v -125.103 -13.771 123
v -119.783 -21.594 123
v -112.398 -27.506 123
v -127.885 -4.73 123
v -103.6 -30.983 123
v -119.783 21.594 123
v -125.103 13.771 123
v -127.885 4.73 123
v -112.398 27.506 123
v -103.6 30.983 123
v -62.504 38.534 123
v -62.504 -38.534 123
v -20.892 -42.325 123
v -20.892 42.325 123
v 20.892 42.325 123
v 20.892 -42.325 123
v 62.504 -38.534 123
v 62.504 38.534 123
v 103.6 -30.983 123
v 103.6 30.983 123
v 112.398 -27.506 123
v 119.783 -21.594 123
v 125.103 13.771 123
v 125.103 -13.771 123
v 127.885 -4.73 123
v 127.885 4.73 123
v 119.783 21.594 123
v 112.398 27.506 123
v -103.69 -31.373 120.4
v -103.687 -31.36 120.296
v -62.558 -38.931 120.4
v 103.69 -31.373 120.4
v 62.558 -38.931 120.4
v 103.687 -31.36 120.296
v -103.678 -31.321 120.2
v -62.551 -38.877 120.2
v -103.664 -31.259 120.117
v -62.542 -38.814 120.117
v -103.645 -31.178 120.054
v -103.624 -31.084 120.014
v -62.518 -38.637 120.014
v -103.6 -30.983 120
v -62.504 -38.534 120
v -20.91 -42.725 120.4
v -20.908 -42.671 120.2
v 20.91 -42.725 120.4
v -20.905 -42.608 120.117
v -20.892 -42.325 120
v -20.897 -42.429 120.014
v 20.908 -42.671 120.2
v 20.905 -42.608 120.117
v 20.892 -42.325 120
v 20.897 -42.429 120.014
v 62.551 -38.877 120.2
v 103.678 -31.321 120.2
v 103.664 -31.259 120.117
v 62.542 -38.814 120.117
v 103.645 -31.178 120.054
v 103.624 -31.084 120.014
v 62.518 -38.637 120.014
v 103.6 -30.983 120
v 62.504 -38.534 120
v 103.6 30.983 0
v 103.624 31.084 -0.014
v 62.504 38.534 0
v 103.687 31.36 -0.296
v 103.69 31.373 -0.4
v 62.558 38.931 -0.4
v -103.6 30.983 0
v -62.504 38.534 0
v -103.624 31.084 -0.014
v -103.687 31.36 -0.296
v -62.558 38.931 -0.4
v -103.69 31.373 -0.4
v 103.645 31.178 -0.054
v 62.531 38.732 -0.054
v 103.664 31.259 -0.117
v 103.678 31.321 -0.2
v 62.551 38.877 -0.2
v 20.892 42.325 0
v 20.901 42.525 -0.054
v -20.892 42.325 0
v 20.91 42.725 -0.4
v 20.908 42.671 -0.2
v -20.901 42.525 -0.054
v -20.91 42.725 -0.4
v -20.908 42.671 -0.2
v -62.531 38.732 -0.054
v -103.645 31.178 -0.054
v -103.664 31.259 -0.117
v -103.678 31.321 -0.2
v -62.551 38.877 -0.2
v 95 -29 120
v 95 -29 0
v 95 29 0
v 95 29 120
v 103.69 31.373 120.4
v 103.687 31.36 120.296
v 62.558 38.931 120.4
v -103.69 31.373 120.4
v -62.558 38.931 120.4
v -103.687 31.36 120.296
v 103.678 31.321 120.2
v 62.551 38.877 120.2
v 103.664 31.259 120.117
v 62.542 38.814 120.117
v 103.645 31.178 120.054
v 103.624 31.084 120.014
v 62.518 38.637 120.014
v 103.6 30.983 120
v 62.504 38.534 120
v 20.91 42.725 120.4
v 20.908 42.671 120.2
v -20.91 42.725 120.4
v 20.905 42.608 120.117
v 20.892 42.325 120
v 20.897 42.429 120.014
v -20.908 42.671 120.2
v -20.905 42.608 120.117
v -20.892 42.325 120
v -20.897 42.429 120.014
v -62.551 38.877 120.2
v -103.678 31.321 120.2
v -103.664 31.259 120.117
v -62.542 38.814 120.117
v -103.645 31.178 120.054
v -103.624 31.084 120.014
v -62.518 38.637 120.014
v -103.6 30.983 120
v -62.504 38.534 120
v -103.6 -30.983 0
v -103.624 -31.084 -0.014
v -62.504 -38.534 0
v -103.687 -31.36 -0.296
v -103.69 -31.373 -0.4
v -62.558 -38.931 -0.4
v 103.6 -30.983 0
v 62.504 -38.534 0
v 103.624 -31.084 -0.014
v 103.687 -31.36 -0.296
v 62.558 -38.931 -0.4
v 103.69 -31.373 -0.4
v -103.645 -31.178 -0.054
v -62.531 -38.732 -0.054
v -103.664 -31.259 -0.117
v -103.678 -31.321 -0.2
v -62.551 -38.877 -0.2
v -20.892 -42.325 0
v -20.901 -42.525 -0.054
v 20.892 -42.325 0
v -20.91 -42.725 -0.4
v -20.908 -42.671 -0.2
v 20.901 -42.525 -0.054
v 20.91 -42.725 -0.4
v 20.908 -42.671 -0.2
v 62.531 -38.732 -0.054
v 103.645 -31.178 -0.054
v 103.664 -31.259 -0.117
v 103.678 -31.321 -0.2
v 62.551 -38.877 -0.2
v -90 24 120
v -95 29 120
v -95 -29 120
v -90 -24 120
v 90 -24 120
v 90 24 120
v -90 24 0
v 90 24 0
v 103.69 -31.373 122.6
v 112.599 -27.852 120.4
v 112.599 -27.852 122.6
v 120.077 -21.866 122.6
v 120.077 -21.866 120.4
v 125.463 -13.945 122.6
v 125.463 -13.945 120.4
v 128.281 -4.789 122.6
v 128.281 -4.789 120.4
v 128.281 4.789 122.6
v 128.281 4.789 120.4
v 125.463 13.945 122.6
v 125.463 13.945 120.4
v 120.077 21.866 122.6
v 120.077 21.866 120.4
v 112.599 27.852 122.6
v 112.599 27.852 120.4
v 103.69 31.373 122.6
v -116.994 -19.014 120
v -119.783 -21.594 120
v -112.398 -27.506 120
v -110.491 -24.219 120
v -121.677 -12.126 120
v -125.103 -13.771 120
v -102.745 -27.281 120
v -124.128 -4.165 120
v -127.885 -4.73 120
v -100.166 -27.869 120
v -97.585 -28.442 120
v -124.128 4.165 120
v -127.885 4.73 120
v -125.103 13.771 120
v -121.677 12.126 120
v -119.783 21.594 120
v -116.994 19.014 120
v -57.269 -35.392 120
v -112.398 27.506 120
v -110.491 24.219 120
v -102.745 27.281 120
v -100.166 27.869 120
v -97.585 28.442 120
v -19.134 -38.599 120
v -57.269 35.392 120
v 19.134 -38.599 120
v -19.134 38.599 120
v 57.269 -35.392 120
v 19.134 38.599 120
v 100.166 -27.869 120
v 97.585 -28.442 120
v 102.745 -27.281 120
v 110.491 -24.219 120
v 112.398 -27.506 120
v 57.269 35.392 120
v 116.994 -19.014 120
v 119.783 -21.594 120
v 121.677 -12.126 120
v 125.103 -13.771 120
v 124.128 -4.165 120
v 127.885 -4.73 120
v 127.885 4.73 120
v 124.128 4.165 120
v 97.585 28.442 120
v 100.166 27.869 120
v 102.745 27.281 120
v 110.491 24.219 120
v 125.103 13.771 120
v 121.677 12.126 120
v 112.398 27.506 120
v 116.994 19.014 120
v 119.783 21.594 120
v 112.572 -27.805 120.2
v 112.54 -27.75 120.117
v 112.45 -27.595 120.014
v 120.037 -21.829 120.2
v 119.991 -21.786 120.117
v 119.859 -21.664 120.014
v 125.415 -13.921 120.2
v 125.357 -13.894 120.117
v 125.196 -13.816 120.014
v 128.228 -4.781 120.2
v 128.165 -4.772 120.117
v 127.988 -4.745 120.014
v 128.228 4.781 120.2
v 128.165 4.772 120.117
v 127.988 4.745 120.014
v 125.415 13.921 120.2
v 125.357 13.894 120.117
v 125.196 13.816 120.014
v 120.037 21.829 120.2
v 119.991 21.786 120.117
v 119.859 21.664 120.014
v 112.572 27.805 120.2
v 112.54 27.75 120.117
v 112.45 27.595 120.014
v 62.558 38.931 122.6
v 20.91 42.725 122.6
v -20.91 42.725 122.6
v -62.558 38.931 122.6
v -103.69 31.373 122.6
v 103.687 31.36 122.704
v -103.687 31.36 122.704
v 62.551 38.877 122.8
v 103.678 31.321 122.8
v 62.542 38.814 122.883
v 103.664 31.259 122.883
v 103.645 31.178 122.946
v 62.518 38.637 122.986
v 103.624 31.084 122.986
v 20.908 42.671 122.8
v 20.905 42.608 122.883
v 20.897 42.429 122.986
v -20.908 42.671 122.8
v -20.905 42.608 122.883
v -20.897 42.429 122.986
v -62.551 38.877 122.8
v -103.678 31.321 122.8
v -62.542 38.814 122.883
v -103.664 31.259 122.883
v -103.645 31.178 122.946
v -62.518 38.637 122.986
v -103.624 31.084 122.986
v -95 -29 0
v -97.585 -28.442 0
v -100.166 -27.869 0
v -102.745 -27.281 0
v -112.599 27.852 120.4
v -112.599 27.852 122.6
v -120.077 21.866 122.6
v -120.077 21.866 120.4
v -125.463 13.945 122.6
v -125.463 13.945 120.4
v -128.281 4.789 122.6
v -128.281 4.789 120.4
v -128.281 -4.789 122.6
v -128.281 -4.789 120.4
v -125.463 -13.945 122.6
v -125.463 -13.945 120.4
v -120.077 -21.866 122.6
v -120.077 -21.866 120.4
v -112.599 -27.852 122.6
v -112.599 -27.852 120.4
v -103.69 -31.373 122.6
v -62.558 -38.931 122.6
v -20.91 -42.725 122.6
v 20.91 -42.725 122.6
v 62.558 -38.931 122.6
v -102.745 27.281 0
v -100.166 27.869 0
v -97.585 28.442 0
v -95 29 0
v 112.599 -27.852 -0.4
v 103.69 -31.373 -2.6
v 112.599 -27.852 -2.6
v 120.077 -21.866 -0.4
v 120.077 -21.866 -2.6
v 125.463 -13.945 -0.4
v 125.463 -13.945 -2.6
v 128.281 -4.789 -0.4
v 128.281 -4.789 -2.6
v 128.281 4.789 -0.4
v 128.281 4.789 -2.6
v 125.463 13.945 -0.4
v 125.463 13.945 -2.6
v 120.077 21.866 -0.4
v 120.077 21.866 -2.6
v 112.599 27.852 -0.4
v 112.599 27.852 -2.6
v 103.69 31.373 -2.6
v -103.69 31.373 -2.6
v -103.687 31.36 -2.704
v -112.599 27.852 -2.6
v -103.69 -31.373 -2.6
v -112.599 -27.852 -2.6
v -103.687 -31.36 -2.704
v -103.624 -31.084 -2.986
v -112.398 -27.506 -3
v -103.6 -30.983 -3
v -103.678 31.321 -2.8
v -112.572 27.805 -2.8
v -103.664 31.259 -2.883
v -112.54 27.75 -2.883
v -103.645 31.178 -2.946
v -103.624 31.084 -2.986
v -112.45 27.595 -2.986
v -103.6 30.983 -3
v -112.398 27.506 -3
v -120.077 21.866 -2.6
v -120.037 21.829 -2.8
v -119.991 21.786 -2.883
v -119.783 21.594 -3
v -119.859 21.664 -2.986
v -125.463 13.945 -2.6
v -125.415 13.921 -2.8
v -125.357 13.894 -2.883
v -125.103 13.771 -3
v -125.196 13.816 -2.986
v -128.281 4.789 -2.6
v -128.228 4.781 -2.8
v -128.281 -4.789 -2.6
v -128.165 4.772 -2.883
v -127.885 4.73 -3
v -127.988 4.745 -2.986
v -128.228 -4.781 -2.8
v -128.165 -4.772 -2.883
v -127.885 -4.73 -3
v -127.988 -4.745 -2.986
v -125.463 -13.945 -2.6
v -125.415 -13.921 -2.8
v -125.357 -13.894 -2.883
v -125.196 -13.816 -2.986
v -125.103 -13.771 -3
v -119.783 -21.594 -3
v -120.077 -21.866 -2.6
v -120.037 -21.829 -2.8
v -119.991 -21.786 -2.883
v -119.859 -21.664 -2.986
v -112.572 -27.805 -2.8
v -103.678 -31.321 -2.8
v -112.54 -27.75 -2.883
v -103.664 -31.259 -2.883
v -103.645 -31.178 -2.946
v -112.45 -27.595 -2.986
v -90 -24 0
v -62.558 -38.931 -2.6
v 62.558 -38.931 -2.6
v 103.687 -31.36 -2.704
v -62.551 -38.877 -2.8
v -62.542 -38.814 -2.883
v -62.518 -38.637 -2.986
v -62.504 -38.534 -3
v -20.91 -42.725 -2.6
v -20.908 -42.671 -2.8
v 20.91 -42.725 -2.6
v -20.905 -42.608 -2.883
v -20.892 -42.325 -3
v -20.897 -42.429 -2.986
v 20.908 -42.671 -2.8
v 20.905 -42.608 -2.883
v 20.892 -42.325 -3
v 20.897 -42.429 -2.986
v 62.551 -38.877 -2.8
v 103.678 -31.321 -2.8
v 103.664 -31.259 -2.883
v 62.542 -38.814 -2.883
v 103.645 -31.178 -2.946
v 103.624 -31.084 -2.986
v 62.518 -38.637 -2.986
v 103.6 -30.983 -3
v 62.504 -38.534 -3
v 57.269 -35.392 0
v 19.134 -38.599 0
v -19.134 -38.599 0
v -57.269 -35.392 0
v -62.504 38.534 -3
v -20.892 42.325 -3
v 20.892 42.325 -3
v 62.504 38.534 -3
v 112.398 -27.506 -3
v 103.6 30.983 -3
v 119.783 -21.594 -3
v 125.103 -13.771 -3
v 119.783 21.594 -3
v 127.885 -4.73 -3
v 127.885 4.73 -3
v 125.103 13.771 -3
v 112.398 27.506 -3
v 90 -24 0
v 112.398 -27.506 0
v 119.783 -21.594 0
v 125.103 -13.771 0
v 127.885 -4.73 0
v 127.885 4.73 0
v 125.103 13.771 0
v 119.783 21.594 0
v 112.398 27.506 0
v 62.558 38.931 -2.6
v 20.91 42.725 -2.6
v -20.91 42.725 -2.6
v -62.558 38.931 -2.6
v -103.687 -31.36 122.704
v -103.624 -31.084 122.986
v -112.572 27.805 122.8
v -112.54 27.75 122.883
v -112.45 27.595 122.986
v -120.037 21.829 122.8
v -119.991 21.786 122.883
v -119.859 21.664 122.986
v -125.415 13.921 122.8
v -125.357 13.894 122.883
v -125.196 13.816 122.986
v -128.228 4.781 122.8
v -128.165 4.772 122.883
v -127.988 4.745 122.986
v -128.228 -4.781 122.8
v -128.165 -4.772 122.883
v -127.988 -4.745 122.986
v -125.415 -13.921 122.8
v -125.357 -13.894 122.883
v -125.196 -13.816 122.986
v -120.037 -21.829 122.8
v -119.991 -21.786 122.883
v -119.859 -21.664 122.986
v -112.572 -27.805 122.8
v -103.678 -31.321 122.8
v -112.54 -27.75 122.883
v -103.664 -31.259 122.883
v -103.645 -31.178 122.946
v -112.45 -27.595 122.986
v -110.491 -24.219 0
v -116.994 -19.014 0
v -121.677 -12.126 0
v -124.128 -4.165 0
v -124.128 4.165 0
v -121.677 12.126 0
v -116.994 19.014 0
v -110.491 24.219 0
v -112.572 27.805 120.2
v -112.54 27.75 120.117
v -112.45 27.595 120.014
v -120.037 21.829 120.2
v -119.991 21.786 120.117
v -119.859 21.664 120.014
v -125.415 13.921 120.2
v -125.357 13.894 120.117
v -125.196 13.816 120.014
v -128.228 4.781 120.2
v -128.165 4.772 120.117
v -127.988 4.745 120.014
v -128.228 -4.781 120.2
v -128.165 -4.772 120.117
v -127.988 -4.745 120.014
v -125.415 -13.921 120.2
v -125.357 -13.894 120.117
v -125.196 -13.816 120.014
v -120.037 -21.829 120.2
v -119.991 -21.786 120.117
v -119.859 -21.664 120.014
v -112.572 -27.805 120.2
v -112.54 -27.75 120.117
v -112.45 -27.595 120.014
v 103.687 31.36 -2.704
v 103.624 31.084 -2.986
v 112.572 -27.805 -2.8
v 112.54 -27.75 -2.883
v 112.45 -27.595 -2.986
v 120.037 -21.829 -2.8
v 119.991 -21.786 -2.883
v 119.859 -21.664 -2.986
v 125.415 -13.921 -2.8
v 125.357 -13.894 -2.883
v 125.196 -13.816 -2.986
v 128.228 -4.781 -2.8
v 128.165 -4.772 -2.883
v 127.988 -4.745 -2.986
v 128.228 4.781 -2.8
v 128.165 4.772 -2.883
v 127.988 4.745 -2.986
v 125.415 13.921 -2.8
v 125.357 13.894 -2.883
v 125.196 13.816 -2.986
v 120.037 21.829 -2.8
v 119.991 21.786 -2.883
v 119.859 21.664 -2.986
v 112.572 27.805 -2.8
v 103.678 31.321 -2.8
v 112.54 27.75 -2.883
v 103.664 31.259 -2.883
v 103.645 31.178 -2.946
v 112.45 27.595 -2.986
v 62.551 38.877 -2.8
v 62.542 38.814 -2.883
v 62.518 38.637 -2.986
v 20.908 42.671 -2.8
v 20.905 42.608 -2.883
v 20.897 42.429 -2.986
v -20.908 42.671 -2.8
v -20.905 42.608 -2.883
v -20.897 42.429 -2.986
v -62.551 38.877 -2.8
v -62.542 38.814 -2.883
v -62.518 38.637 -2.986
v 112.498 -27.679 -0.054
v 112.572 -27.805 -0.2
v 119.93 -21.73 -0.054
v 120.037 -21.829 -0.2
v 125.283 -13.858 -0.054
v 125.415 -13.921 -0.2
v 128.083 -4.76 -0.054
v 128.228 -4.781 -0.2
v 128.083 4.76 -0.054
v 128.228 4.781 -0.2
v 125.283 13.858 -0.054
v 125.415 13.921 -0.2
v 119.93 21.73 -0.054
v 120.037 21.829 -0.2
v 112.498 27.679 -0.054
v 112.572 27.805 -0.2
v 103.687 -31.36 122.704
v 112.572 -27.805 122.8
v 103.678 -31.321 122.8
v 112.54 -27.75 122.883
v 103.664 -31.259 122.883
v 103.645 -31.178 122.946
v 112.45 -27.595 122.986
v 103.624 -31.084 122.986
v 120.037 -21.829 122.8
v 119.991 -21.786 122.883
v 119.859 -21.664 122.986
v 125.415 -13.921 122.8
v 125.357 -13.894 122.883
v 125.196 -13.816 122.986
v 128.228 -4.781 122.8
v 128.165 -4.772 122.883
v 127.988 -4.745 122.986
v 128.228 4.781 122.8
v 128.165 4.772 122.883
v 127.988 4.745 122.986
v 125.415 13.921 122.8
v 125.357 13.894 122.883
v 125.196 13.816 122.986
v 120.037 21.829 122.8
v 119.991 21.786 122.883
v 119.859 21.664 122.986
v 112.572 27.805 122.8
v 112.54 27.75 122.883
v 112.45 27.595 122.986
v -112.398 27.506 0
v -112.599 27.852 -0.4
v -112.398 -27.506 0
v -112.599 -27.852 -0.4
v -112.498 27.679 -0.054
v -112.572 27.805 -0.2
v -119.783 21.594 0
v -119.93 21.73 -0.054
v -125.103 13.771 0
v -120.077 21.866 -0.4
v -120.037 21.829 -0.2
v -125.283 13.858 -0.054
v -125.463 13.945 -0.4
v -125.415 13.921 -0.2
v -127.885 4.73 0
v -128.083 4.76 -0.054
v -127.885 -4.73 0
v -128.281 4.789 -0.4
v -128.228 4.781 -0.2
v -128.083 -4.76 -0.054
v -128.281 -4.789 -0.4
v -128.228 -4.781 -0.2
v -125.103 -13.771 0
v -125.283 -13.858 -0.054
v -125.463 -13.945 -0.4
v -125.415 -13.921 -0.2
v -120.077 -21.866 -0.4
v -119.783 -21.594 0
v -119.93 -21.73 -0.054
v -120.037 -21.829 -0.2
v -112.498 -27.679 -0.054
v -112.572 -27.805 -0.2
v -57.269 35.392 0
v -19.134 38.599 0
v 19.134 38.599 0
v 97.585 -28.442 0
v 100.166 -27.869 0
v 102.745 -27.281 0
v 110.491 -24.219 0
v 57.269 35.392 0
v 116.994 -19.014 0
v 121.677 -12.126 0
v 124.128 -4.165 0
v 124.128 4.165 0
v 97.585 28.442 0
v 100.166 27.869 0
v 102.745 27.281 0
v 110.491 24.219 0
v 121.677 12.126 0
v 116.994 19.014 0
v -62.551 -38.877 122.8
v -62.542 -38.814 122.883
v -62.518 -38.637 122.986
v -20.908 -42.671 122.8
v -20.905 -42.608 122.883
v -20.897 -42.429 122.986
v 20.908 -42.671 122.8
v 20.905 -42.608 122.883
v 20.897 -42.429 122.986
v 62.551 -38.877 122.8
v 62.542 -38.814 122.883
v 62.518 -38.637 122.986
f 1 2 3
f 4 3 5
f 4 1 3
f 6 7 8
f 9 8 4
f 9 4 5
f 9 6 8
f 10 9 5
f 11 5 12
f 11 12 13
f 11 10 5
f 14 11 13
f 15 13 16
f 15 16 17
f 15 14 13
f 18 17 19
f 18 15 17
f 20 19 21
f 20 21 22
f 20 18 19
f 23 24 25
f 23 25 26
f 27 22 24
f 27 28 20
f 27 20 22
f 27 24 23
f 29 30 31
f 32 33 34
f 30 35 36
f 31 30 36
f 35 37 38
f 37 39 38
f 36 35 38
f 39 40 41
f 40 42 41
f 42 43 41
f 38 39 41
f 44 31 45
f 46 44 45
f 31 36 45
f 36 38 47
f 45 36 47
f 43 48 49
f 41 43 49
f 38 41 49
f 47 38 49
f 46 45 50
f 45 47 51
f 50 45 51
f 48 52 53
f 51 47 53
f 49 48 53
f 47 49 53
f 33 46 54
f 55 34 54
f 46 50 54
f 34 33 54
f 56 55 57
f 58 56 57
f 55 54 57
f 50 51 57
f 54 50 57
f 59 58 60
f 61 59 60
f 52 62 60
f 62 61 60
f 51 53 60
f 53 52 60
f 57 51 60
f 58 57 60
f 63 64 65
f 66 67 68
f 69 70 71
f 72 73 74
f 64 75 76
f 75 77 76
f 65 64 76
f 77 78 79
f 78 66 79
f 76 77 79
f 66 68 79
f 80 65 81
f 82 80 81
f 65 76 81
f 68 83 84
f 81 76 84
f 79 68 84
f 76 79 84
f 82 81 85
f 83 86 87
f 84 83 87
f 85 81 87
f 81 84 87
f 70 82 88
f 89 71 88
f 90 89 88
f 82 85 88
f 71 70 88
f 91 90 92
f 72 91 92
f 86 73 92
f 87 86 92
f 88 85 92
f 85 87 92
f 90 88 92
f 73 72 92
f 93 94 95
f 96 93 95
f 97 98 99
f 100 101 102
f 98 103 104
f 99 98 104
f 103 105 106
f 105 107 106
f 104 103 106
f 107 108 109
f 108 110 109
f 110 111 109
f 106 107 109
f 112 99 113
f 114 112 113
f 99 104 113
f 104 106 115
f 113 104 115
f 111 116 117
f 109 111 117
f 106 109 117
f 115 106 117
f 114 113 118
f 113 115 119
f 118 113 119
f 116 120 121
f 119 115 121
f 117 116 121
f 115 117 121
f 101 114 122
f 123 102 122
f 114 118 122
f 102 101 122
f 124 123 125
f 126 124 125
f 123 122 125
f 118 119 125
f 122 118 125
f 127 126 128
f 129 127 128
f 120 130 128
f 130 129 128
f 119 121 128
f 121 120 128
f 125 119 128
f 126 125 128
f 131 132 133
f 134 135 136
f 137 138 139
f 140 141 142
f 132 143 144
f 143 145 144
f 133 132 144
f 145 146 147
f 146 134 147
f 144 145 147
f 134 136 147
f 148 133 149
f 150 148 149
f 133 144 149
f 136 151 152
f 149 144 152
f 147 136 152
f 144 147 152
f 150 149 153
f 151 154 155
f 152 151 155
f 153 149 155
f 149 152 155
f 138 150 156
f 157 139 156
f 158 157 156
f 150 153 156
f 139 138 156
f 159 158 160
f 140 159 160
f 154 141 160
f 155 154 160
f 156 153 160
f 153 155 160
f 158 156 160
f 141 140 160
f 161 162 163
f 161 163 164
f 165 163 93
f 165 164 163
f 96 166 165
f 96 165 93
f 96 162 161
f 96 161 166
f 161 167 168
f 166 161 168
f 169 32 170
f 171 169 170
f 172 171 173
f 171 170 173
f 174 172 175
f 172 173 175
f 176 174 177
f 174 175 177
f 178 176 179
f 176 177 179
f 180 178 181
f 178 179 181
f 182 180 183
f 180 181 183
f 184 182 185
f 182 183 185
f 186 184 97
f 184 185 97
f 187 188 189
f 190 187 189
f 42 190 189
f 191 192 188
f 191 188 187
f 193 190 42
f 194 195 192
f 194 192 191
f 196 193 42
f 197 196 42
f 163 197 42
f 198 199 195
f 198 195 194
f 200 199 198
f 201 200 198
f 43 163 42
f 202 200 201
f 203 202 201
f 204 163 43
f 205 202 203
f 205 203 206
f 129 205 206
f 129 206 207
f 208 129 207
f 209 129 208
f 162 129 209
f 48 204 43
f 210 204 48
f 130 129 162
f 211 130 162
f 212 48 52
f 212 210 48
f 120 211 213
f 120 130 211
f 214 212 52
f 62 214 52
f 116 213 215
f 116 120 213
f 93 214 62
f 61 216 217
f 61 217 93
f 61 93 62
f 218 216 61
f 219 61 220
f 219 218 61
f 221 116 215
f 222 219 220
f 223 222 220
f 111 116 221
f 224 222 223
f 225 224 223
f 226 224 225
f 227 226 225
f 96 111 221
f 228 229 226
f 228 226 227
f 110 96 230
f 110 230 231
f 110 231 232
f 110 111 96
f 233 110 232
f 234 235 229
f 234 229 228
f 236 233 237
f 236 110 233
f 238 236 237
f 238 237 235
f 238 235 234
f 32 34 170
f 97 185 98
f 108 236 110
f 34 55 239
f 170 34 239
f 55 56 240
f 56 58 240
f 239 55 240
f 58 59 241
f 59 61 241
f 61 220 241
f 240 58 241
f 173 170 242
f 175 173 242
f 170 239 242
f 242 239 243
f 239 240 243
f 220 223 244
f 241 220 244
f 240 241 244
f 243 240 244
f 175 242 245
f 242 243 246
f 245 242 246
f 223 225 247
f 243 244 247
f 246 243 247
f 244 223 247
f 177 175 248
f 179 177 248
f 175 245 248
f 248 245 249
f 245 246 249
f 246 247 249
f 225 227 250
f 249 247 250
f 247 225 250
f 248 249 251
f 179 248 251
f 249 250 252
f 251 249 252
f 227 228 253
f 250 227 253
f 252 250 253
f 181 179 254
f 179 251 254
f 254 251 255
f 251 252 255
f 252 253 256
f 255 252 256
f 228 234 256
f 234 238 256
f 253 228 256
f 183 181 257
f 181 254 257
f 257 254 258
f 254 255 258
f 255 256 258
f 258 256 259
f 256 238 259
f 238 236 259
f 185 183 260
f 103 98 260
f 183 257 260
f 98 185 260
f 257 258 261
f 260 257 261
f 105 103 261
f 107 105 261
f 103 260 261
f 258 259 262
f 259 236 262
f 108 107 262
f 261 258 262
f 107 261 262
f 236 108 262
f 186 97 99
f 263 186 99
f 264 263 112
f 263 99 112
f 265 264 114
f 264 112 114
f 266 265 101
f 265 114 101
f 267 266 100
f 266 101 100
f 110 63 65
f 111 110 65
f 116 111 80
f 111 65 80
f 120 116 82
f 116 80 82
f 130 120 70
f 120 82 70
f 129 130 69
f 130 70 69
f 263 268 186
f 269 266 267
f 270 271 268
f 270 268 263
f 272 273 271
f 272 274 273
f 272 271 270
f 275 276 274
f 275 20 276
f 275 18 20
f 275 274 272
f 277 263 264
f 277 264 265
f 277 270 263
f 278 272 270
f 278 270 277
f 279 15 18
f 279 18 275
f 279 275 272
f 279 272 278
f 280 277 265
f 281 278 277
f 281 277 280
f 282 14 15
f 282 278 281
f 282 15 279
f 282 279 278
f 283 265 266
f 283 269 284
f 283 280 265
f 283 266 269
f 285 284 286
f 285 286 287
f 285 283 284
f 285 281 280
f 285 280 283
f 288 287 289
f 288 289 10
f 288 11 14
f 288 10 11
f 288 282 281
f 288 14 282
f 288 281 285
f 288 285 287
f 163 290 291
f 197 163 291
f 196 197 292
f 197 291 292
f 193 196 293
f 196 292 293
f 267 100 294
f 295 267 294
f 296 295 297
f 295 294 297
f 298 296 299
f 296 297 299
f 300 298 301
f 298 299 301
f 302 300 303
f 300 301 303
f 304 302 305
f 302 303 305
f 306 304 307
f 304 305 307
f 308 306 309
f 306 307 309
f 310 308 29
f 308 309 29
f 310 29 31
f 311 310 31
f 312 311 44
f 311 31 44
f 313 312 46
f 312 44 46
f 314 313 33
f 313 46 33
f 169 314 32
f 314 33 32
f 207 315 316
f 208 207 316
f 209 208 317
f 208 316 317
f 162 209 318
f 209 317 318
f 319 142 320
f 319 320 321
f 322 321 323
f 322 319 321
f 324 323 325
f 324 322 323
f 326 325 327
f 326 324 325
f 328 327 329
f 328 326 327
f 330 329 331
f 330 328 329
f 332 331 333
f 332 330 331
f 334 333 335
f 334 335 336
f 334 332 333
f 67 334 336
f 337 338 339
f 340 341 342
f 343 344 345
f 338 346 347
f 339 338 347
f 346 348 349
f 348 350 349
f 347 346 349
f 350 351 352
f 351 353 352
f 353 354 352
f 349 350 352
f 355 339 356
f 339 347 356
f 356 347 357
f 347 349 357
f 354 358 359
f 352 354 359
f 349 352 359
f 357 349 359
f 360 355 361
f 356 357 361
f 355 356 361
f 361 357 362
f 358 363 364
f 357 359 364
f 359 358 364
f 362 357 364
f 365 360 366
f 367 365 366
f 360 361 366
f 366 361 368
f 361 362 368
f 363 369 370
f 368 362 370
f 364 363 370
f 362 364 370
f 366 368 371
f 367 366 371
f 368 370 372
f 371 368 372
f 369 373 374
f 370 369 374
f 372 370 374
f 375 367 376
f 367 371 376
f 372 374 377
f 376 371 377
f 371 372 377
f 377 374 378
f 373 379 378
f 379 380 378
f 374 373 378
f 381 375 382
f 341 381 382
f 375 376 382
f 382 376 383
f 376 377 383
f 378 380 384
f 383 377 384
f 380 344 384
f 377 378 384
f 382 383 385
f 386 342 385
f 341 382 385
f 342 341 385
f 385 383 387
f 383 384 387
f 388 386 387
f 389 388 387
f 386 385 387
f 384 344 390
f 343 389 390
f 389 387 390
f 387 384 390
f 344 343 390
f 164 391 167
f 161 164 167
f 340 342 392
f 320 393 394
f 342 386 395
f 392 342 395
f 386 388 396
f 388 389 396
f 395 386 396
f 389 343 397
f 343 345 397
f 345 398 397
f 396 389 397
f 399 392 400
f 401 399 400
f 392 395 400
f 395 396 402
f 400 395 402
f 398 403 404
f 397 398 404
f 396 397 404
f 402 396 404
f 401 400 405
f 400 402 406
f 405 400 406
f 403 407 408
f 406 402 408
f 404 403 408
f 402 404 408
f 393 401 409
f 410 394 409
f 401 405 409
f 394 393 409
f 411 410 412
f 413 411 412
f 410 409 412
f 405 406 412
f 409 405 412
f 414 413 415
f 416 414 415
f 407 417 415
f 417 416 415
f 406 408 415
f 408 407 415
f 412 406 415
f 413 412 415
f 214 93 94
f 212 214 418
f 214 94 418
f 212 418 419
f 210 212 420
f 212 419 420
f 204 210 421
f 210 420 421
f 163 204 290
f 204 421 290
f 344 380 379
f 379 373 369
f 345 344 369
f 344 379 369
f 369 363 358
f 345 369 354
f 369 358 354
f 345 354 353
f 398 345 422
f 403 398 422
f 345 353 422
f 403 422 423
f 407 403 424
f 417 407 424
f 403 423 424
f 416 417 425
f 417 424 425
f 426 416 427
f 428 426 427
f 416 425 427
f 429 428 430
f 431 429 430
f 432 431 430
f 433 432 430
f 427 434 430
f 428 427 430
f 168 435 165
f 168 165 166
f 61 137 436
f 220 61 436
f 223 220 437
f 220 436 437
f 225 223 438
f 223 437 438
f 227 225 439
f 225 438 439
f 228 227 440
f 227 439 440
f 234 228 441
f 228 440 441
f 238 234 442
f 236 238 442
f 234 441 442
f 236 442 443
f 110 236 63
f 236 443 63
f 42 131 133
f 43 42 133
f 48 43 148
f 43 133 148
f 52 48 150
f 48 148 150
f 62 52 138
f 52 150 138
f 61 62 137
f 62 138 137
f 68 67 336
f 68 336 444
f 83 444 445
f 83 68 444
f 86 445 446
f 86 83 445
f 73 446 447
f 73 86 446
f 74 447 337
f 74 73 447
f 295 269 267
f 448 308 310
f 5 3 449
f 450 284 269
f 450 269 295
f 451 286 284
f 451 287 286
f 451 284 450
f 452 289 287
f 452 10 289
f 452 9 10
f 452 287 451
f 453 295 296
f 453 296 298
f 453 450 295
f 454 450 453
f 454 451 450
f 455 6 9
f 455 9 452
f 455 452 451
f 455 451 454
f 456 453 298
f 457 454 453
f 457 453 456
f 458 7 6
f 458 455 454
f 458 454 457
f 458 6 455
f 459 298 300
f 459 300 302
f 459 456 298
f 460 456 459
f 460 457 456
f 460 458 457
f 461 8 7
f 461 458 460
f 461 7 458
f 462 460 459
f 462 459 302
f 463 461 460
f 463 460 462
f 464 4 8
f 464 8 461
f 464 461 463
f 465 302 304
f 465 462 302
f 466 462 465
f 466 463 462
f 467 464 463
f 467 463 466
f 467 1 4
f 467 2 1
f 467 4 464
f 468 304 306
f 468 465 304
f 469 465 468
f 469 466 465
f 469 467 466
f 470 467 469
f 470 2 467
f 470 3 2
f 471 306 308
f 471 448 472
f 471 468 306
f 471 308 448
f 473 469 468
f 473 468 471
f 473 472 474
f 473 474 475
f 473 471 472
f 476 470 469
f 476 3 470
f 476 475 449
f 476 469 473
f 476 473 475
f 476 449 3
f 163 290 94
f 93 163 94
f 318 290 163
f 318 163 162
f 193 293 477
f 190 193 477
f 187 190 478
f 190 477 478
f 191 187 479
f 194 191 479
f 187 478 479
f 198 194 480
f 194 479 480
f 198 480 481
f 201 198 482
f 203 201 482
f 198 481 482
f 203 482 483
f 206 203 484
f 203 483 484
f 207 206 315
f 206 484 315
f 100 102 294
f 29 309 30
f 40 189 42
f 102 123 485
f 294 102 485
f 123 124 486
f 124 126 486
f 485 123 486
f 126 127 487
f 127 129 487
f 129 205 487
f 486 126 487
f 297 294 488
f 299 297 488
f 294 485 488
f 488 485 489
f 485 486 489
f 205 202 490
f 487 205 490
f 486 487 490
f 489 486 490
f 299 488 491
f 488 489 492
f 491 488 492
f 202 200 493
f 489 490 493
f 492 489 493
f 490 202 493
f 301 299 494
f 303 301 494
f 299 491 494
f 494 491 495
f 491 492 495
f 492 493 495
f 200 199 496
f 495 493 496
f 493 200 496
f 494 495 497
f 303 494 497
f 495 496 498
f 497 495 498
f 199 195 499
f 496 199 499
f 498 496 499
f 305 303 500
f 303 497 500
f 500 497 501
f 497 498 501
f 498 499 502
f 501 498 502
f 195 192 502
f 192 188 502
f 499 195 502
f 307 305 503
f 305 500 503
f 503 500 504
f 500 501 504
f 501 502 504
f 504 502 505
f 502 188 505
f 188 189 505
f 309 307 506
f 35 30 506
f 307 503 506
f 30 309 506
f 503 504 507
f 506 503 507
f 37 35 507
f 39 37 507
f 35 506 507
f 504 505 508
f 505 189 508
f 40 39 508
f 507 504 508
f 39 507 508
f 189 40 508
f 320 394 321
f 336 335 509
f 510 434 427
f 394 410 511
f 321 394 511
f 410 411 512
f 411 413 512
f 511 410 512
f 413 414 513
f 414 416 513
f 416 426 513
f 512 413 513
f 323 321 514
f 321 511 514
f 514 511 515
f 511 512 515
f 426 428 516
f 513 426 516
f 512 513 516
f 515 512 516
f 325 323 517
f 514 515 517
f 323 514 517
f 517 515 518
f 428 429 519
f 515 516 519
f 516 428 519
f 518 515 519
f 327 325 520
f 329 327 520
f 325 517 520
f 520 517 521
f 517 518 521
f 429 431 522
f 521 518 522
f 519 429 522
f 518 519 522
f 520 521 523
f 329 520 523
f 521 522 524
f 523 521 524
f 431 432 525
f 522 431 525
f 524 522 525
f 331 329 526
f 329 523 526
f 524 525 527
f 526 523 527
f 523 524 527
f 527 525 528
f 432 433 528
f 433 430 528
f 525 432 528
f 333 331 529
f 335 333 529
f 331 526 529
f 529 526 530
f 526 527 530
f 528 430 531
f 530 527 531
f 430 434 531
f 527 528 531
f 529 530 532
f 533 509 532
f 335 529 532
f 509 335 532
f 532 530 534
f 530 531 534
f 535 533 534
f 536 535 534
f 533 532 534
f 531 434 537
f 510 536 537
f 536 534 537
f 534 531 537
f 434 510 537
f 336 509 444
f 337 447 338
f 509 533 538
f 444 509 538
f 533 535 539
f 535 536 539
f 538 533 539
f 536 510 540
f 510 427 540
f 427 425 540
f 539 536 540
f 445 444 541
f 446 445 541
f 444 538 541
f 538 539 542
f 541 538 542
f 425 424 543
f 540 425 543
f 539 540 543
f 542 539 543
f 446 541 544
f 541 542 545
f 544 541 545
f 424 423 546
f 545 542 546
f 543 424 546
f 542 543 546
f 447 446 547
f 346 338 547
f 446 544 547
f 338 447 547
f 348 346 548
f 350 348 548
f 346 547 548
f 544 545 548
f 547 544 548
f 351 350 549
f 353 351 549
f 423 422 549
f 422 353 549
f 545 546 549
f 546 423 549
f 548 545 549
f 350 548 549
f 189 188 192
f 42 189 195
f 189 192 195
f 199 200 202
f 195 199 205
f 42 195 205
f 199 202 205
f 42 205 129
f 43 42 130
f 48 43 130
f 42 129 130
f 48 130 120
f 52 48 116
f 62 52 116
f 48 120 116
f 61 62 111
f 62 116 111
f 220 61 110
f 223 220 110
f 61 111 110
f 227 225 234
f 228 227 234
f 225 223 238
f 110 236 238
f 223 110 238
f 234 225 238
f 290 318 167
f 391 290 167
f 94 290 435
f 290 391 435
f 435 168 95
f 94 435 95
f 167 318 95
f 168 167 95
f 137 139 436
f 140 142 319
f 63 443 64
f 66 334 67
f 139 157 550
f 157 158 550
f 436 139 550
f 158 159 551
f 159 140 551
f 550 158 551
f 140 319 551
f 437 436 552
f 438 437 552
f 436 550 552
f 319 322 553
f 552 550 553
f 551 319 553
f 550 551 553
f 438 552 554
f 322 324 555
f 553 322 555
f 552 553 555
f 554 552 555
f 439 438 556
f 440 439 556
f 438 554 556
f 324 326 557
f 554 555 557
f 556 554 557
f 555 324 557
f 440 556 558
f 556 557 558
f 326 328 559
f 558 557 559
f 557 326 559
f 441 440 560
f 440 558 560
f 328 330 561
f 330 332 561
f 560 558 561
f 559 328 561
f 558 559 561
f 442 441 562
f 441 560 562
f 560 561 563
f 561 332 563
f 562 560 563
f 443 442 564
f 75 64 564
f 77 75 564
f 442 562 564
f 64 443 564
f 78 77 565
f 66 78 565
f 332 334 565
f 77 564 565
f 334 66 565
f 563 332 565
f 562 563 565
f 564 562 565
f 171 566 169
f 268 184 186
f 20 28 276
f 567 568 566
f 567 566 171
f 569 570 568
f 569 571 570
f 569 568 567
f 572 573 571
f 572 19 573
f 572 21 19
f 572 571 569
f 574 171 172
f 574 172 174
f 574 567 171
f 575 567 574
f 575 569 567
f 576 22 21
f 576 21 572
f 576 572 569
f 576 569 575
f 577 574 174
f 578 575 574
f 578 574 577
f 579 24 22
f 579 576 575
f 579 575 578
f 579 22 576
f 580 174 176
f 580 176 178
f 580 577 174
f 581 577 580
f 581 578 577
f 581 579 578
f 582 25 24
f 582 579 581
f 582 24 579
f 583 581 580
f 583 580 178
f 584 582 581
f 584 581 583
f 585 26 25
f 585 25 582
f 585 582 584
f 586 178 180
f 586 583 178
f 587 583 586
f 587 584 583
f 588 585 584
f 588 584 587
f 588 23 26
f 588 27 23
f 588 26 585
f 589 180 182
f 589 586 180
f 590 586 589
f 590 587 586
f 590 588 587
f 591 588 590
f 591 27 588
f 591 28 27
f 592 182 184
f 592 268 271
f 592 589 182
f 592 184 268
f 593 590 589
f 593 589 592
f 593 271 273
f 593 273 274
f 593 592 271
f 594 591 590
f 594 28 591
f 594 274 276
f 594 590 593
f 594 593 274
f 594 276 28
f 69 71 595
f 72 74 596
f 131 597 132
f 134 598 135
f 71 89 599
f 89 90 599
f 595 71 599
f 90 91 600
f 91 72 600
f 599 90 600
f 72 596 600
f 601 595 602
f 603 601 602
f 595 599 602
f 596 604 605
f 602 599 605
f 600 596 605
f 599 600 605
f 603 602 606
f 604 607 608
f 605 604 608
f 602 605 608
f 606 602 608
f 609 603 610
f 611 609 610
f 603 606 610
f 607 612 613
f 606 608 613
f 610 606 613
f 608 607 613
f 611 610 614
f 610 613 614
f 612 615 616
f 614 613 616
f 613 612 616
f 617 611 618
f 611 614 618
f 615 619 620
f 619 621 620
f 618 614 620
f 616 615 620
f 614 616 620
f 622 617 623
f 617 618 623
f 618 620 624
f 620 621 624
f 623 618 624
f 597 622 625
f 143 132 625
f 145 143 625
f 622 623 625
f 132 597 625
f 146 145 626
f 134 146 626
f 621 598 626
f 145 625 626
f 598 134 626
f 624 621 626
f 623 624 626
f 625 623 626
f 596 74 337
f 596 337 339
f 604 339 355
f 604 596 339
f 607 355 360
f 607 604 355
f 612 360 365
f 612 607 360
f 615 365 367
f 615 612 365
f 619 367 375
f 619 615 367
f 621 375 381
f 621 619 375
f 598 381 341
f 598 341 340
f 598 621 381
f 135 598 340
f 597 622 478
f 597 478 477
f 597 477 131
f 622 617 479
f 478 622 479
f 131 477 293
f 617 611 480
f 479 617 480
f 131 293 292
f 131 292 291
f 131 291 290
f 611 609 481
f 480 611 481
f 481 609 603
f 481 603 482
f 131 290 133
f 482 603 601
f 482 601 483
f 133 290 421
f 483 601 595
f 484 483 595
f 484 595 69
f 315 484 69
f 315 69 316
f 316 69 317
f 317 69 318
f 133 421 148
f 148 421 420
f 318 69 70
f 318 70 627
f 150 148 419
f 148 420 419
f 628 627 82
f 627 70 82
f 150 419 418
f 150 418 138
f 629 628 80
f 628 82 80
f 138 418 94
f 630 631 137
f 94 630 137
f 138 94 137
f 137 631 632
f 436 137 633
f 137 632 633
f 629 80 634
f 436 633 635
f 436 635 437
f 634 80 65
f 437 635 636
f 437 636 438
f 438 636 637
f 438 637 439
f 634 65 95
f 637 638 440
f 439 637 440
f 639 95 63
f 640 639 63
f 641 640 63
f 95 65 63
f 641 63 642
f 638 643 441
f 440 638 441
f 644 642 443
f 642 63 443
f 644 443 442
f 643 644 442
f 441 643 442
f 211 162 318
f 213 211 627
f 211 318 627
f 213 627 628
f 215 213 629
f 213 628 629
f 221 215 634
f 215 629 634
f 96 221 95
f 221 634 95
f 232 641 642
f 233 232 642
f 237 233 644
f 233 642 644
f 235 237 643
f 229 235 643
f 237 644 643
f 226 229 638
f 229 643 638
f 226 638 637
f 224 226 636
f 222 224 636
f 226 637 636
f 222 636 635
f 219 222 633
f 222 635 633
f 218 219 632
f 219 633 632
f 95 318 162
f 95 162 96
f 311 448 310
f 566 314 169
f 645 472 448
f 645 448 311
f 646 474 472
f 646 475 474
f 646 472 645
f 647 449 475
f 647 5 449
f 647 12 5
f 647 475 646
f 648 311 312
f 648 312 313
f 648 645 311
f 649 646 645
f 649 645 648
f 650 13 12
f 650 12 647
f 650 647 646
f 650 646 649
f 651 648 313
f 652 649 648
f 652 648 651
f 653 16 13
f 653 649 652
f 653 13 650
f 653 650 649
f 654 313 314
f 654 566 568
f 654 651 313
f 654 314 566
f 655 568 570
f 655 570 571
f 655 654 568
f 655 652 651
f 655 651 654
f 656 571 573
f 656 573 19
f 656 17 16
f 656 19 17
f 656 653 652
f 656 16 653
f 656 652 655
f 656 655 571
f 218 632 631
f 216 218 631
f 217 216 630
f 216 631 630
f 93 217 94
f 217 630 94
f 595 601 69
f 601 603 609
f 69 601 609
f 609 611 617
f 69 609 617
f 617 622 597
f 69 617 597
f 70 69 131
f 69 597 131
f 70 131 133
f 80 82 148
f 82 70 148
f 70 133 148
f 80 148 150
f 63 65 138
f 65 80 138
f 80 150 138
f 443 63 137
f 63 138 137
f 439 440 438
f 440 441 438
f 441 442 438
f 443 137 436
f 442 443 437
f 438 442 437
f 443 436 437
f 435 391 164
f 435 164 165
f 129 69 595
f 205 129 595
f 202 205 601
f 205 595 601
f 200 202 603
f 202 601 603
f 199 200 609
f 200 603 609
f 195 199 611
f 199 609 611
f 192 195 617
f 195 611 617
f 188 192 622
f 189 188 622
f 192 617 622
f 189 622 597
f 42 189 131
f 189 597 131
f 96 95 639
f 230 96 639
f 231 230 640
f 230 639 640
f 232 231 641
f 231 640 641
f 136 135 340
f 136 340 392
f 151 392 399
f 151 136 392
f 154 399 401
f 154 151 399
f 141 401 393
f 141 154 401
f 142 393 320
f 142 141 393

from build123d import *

# Parameters (mm, degrees)
F1_DEPTH = 120
F0_W     = 190
F0_H     = 58
F0_W_2   = 180
F0_H_2   = 48
F2_DEPTH = 3
F6_DEPTH = 3
F7_R     = 0.4
F7_2_R   = 0.4


with BuildPart() as f1:
    # F0 (on Top) → F1 (new body)
    with BuildSketch(Plane.XY):
        with BuildLine():
            ThreePointArc((103.600252035, -30.9831873905), (128.2390999543, 0), (103.600252035, 30.9831873905))
            ThreePointArc((103.600252035, 30.9831873905), (0, 42.8), (-103.600252035, 30.9831873905))
            ThreePointArc((-103.600252035, 30.9831873905), (-128.2390999543, 0), (-103.600252035, -30.9831873905))
            ThreePointArc((-103.600252035, -30.9831873905), (0, -42.8), (103.600252035, -30.9831873905))
        make_face()
        with BuildLine():
            ThreePointArc((-95, 29), (0, 39), (95, 29))
            ThreePointArc((95, 29), (98.8759950973, 28.157229503), (102.7445168807, 27.2807939288))
            ThreePointArc((102.7445168807, 27.2807939288), (124.4390999543, 0), (102.7445168807, -27.2807939288))
            ThreePointArc((102.7445168807, -27.2807939288), (98.8759950973, -28.157229503), (95, -29))
            ThreePointArc((95, -29), (0, -39), (-95, -29))
            ThreePointArc((-95, -29), (-98.8759950973, -28.157229503), (-102.7445168807, -27.2807939288))
            ThreePointArc((-102.7445168807, -27.2807939288), (-124.4390999543, 0), (-102.7445168807, 27.2807939288))
            ThreePointArc((-102.7445168807, 27.2807939288), (-98.8759950973, 28.157229503), (-95, 29))
        make_face(mode=Mode.SUBTRACT)
    extrude(amount=F1_DEPTH)


with BuildPart() as f1b:
    # F0 (on Top) → F1, piece 2 (new body)
    with BuildSketch(Plane.XY):
        Rectangle(F0_W, F0_H)
        Rectangle(F0_W_2, F0_H_2, mode=Mode.SUBTRACT)
    extrude(amount=F1_DEPTH)


with BuildPart() as f2:
    # F0 (on Top) + F1_face (on face) → F2 (new body)
    with BuildSketch(Plane.XY):
        with BuildLine():
            ThreePointArc((103.6903294197, -31.3729130181), (128.6390999543, 0), (103.6903294197, 31.3729130181))
            ThreePointArc((103.6903294197, 31.3729130181), (0, 43.2), (-103.6903294197, 31.3729130181))
            ThreePointArc((-103.6903294197, 31.3729130181), (-128.6390999543, 0), (-103.6903294197, -31.3729130181))
            ThreePointArc((-103.6903294197, -31.3729130181), (0, -43.2), (103.6903294197, -31.3729130181))
        make_face()
        with BuildLine():
            ThreePointArc((-103.600252035, 30.9831873905), (0, 42.8), (103.600252035, 30.9831873905))
            ThreePointArc((103.600252035, 30.9831873905), (128.2390999543, 0), (103.600252035, -30.9831873905))
            ThreePointArc((103.600252035, -30.9831873905), (0, -42.8), (-103.600252035, -30.9831873905))
            ThreePointArc((-103.600252035, -30.9831873905), (-128.2390999543, 0), (-103.600252035, 30.9831873905))
        make_face(mode=Mode.SUBTRACT)
        with BuildLine():
            ThreePointArc((102.7445168807, 27.2807939288), (98.8759950973, 28.157229503), (95, 29))
            Line((95, 29), (95, -29))
            ThreePointArc((95, -29), (98.8759950973, -28.157229503), (102.7445168807, -27.2807939288))
            ThreePointArc((102.7445168807, -27.2807939288), (124.4390999543, 0), (102.7445168807, 27.2807939288))
        make_face()
        with BuildLine():
            Line((-95, 29), (95, 29))
            ThreePointArc((95, 29), (0, 39), (-95, 29))
        make_face()
        Rectangle(F0_W, F0_H)
        Rectangle(F0_W_2, F0_H_2, mode=Mode.SUBTRACT)
        Rectangle(F0_W_2, F0_H_2)
        with BuildLine():
            ThreePointArc((-95, -29), (0, -39), (95, -29))
            Line((95, -29), (-95, -29))
        make_face()
        with BuildLine():
            Line((-95, -29), (-95, 29))
            ThreePointArc((-95, 29), (-98.8759950973, 28.157229503), (-102.7445168807, 27.2807939288))
            ThreePointArc((-102.7445168807, 27.2807939288), (-124.4390999543, 0), (-102.7445168807, -27.2807939288))
            ThreePointArc((-102.7445168807, -27.2807939288), (-98.8759950973, -28.157229503), (-95, -29))
        make_face()
    with BuildSketch(Plane(origin=(0, -1e-10, 0), x_dir=(1, 0, 0), z_dir=(0, 0, -1))):
        with BuildLine():
            ThreePointArc((103.600252035, 30.9831873904), (0, 42.7999999999), (-103.600252035, 30.9831873904))
            ThreePointArc((-103.600252035, 30.9831873904), (-128.2390999543, -1e-10), (-103.600252035, -30.9831873907))
            ThreePointArc((-103.600252035, -30.9831873907), (0, -42.8000000001), (103.600252035, -30.9831873907))
            ThreePointArc((103.600252035, -30.9831873907), (128.2390999543, -1e-10), (103.600252035, 30.9831873904))
        make_face()
        with BuildLine():
            ThreePointArc((-102.7445168807, -27.2807939289), (-124.4390999543, -1e-10), (-102.7445168807, 27.2807939287))
            ThreePointArc((-102.7445168807, 27.2807939286), (0, 38.9999999999), (102.7445168807, 27.2807939287))
            ThreePointArc((102.7445168807, 27.2807939287), (124.4390999543, -1e-10), (102.7445168807, -27.2807939289))
            ThreePointArc((102.7445168807, -27.2807939289), (0, -39.0000000001), (-102.7445168807, -27.2807939289))
        make_face(mode=Mode.SUBTRACT)
    extrude(amount=-F2_DEPTH, dir=(0, 0, 1))

    # F3: union 

    # F4: union 

    # F7#2
    f7_2_edges = [f2.edges().sort_by_distance(p)[0] for p in [
        (-128.6391, 0, 0),
        (0, -43.2, 0),
        (128.6391, 0, 0),
        (0, 43.2, 0),
        (-128.6391, 0, -3),
        (0, -43.2, -3),
        (128.6391, 0, -3),
        (0, 43.2, -3),
    ]]
    fillet(f7_2_edges, radius=F7_2_R)


with BuildPart() as f6:
    # F5 (on face) → F6 (new body)
    with BuildSketch(Plane.XY.offset(120)):
        with BuildLine():
            ThreePointArc((-103.6903294197, 31.3729130181), (-128.6390999543, 0), (-103.6903294197, -31.3729130181))
            ThreePointArc((-103.6903294197, -31.3729130181), (0, -43.2), (103.6903294197, -31.3729130181))
            ThreePointArc((103.6903294197, -31.3729130181), (128.6390999543, 0), (103.6903294197, 31.3729130181))
            ThreePointArc((103.6903294197, 31.3729130181), (0, 43.2), (-103.6903294197, 31.3729130181))
        make_face()
    extrude(amount=F6_DEPTH)

    # F7
    f7_edges = [f6.edges().sort_by_distance(p)[0] for p in [
        (-128.6391, 0, 123),
        (0, -43.2, 123),
        (128.6391, 0, 123),
        (0, 43.2, 123),
        (-128.6391, 0, 120),
        (0, -43.2, 120),
        (128.6391, 0, 120),
        (0, 43.2, 120),
    ]]
    fillet(f7_edges, radius=F7_R)


solid = Compound([f1.part, f1b.part, f2.part, f6.part])
